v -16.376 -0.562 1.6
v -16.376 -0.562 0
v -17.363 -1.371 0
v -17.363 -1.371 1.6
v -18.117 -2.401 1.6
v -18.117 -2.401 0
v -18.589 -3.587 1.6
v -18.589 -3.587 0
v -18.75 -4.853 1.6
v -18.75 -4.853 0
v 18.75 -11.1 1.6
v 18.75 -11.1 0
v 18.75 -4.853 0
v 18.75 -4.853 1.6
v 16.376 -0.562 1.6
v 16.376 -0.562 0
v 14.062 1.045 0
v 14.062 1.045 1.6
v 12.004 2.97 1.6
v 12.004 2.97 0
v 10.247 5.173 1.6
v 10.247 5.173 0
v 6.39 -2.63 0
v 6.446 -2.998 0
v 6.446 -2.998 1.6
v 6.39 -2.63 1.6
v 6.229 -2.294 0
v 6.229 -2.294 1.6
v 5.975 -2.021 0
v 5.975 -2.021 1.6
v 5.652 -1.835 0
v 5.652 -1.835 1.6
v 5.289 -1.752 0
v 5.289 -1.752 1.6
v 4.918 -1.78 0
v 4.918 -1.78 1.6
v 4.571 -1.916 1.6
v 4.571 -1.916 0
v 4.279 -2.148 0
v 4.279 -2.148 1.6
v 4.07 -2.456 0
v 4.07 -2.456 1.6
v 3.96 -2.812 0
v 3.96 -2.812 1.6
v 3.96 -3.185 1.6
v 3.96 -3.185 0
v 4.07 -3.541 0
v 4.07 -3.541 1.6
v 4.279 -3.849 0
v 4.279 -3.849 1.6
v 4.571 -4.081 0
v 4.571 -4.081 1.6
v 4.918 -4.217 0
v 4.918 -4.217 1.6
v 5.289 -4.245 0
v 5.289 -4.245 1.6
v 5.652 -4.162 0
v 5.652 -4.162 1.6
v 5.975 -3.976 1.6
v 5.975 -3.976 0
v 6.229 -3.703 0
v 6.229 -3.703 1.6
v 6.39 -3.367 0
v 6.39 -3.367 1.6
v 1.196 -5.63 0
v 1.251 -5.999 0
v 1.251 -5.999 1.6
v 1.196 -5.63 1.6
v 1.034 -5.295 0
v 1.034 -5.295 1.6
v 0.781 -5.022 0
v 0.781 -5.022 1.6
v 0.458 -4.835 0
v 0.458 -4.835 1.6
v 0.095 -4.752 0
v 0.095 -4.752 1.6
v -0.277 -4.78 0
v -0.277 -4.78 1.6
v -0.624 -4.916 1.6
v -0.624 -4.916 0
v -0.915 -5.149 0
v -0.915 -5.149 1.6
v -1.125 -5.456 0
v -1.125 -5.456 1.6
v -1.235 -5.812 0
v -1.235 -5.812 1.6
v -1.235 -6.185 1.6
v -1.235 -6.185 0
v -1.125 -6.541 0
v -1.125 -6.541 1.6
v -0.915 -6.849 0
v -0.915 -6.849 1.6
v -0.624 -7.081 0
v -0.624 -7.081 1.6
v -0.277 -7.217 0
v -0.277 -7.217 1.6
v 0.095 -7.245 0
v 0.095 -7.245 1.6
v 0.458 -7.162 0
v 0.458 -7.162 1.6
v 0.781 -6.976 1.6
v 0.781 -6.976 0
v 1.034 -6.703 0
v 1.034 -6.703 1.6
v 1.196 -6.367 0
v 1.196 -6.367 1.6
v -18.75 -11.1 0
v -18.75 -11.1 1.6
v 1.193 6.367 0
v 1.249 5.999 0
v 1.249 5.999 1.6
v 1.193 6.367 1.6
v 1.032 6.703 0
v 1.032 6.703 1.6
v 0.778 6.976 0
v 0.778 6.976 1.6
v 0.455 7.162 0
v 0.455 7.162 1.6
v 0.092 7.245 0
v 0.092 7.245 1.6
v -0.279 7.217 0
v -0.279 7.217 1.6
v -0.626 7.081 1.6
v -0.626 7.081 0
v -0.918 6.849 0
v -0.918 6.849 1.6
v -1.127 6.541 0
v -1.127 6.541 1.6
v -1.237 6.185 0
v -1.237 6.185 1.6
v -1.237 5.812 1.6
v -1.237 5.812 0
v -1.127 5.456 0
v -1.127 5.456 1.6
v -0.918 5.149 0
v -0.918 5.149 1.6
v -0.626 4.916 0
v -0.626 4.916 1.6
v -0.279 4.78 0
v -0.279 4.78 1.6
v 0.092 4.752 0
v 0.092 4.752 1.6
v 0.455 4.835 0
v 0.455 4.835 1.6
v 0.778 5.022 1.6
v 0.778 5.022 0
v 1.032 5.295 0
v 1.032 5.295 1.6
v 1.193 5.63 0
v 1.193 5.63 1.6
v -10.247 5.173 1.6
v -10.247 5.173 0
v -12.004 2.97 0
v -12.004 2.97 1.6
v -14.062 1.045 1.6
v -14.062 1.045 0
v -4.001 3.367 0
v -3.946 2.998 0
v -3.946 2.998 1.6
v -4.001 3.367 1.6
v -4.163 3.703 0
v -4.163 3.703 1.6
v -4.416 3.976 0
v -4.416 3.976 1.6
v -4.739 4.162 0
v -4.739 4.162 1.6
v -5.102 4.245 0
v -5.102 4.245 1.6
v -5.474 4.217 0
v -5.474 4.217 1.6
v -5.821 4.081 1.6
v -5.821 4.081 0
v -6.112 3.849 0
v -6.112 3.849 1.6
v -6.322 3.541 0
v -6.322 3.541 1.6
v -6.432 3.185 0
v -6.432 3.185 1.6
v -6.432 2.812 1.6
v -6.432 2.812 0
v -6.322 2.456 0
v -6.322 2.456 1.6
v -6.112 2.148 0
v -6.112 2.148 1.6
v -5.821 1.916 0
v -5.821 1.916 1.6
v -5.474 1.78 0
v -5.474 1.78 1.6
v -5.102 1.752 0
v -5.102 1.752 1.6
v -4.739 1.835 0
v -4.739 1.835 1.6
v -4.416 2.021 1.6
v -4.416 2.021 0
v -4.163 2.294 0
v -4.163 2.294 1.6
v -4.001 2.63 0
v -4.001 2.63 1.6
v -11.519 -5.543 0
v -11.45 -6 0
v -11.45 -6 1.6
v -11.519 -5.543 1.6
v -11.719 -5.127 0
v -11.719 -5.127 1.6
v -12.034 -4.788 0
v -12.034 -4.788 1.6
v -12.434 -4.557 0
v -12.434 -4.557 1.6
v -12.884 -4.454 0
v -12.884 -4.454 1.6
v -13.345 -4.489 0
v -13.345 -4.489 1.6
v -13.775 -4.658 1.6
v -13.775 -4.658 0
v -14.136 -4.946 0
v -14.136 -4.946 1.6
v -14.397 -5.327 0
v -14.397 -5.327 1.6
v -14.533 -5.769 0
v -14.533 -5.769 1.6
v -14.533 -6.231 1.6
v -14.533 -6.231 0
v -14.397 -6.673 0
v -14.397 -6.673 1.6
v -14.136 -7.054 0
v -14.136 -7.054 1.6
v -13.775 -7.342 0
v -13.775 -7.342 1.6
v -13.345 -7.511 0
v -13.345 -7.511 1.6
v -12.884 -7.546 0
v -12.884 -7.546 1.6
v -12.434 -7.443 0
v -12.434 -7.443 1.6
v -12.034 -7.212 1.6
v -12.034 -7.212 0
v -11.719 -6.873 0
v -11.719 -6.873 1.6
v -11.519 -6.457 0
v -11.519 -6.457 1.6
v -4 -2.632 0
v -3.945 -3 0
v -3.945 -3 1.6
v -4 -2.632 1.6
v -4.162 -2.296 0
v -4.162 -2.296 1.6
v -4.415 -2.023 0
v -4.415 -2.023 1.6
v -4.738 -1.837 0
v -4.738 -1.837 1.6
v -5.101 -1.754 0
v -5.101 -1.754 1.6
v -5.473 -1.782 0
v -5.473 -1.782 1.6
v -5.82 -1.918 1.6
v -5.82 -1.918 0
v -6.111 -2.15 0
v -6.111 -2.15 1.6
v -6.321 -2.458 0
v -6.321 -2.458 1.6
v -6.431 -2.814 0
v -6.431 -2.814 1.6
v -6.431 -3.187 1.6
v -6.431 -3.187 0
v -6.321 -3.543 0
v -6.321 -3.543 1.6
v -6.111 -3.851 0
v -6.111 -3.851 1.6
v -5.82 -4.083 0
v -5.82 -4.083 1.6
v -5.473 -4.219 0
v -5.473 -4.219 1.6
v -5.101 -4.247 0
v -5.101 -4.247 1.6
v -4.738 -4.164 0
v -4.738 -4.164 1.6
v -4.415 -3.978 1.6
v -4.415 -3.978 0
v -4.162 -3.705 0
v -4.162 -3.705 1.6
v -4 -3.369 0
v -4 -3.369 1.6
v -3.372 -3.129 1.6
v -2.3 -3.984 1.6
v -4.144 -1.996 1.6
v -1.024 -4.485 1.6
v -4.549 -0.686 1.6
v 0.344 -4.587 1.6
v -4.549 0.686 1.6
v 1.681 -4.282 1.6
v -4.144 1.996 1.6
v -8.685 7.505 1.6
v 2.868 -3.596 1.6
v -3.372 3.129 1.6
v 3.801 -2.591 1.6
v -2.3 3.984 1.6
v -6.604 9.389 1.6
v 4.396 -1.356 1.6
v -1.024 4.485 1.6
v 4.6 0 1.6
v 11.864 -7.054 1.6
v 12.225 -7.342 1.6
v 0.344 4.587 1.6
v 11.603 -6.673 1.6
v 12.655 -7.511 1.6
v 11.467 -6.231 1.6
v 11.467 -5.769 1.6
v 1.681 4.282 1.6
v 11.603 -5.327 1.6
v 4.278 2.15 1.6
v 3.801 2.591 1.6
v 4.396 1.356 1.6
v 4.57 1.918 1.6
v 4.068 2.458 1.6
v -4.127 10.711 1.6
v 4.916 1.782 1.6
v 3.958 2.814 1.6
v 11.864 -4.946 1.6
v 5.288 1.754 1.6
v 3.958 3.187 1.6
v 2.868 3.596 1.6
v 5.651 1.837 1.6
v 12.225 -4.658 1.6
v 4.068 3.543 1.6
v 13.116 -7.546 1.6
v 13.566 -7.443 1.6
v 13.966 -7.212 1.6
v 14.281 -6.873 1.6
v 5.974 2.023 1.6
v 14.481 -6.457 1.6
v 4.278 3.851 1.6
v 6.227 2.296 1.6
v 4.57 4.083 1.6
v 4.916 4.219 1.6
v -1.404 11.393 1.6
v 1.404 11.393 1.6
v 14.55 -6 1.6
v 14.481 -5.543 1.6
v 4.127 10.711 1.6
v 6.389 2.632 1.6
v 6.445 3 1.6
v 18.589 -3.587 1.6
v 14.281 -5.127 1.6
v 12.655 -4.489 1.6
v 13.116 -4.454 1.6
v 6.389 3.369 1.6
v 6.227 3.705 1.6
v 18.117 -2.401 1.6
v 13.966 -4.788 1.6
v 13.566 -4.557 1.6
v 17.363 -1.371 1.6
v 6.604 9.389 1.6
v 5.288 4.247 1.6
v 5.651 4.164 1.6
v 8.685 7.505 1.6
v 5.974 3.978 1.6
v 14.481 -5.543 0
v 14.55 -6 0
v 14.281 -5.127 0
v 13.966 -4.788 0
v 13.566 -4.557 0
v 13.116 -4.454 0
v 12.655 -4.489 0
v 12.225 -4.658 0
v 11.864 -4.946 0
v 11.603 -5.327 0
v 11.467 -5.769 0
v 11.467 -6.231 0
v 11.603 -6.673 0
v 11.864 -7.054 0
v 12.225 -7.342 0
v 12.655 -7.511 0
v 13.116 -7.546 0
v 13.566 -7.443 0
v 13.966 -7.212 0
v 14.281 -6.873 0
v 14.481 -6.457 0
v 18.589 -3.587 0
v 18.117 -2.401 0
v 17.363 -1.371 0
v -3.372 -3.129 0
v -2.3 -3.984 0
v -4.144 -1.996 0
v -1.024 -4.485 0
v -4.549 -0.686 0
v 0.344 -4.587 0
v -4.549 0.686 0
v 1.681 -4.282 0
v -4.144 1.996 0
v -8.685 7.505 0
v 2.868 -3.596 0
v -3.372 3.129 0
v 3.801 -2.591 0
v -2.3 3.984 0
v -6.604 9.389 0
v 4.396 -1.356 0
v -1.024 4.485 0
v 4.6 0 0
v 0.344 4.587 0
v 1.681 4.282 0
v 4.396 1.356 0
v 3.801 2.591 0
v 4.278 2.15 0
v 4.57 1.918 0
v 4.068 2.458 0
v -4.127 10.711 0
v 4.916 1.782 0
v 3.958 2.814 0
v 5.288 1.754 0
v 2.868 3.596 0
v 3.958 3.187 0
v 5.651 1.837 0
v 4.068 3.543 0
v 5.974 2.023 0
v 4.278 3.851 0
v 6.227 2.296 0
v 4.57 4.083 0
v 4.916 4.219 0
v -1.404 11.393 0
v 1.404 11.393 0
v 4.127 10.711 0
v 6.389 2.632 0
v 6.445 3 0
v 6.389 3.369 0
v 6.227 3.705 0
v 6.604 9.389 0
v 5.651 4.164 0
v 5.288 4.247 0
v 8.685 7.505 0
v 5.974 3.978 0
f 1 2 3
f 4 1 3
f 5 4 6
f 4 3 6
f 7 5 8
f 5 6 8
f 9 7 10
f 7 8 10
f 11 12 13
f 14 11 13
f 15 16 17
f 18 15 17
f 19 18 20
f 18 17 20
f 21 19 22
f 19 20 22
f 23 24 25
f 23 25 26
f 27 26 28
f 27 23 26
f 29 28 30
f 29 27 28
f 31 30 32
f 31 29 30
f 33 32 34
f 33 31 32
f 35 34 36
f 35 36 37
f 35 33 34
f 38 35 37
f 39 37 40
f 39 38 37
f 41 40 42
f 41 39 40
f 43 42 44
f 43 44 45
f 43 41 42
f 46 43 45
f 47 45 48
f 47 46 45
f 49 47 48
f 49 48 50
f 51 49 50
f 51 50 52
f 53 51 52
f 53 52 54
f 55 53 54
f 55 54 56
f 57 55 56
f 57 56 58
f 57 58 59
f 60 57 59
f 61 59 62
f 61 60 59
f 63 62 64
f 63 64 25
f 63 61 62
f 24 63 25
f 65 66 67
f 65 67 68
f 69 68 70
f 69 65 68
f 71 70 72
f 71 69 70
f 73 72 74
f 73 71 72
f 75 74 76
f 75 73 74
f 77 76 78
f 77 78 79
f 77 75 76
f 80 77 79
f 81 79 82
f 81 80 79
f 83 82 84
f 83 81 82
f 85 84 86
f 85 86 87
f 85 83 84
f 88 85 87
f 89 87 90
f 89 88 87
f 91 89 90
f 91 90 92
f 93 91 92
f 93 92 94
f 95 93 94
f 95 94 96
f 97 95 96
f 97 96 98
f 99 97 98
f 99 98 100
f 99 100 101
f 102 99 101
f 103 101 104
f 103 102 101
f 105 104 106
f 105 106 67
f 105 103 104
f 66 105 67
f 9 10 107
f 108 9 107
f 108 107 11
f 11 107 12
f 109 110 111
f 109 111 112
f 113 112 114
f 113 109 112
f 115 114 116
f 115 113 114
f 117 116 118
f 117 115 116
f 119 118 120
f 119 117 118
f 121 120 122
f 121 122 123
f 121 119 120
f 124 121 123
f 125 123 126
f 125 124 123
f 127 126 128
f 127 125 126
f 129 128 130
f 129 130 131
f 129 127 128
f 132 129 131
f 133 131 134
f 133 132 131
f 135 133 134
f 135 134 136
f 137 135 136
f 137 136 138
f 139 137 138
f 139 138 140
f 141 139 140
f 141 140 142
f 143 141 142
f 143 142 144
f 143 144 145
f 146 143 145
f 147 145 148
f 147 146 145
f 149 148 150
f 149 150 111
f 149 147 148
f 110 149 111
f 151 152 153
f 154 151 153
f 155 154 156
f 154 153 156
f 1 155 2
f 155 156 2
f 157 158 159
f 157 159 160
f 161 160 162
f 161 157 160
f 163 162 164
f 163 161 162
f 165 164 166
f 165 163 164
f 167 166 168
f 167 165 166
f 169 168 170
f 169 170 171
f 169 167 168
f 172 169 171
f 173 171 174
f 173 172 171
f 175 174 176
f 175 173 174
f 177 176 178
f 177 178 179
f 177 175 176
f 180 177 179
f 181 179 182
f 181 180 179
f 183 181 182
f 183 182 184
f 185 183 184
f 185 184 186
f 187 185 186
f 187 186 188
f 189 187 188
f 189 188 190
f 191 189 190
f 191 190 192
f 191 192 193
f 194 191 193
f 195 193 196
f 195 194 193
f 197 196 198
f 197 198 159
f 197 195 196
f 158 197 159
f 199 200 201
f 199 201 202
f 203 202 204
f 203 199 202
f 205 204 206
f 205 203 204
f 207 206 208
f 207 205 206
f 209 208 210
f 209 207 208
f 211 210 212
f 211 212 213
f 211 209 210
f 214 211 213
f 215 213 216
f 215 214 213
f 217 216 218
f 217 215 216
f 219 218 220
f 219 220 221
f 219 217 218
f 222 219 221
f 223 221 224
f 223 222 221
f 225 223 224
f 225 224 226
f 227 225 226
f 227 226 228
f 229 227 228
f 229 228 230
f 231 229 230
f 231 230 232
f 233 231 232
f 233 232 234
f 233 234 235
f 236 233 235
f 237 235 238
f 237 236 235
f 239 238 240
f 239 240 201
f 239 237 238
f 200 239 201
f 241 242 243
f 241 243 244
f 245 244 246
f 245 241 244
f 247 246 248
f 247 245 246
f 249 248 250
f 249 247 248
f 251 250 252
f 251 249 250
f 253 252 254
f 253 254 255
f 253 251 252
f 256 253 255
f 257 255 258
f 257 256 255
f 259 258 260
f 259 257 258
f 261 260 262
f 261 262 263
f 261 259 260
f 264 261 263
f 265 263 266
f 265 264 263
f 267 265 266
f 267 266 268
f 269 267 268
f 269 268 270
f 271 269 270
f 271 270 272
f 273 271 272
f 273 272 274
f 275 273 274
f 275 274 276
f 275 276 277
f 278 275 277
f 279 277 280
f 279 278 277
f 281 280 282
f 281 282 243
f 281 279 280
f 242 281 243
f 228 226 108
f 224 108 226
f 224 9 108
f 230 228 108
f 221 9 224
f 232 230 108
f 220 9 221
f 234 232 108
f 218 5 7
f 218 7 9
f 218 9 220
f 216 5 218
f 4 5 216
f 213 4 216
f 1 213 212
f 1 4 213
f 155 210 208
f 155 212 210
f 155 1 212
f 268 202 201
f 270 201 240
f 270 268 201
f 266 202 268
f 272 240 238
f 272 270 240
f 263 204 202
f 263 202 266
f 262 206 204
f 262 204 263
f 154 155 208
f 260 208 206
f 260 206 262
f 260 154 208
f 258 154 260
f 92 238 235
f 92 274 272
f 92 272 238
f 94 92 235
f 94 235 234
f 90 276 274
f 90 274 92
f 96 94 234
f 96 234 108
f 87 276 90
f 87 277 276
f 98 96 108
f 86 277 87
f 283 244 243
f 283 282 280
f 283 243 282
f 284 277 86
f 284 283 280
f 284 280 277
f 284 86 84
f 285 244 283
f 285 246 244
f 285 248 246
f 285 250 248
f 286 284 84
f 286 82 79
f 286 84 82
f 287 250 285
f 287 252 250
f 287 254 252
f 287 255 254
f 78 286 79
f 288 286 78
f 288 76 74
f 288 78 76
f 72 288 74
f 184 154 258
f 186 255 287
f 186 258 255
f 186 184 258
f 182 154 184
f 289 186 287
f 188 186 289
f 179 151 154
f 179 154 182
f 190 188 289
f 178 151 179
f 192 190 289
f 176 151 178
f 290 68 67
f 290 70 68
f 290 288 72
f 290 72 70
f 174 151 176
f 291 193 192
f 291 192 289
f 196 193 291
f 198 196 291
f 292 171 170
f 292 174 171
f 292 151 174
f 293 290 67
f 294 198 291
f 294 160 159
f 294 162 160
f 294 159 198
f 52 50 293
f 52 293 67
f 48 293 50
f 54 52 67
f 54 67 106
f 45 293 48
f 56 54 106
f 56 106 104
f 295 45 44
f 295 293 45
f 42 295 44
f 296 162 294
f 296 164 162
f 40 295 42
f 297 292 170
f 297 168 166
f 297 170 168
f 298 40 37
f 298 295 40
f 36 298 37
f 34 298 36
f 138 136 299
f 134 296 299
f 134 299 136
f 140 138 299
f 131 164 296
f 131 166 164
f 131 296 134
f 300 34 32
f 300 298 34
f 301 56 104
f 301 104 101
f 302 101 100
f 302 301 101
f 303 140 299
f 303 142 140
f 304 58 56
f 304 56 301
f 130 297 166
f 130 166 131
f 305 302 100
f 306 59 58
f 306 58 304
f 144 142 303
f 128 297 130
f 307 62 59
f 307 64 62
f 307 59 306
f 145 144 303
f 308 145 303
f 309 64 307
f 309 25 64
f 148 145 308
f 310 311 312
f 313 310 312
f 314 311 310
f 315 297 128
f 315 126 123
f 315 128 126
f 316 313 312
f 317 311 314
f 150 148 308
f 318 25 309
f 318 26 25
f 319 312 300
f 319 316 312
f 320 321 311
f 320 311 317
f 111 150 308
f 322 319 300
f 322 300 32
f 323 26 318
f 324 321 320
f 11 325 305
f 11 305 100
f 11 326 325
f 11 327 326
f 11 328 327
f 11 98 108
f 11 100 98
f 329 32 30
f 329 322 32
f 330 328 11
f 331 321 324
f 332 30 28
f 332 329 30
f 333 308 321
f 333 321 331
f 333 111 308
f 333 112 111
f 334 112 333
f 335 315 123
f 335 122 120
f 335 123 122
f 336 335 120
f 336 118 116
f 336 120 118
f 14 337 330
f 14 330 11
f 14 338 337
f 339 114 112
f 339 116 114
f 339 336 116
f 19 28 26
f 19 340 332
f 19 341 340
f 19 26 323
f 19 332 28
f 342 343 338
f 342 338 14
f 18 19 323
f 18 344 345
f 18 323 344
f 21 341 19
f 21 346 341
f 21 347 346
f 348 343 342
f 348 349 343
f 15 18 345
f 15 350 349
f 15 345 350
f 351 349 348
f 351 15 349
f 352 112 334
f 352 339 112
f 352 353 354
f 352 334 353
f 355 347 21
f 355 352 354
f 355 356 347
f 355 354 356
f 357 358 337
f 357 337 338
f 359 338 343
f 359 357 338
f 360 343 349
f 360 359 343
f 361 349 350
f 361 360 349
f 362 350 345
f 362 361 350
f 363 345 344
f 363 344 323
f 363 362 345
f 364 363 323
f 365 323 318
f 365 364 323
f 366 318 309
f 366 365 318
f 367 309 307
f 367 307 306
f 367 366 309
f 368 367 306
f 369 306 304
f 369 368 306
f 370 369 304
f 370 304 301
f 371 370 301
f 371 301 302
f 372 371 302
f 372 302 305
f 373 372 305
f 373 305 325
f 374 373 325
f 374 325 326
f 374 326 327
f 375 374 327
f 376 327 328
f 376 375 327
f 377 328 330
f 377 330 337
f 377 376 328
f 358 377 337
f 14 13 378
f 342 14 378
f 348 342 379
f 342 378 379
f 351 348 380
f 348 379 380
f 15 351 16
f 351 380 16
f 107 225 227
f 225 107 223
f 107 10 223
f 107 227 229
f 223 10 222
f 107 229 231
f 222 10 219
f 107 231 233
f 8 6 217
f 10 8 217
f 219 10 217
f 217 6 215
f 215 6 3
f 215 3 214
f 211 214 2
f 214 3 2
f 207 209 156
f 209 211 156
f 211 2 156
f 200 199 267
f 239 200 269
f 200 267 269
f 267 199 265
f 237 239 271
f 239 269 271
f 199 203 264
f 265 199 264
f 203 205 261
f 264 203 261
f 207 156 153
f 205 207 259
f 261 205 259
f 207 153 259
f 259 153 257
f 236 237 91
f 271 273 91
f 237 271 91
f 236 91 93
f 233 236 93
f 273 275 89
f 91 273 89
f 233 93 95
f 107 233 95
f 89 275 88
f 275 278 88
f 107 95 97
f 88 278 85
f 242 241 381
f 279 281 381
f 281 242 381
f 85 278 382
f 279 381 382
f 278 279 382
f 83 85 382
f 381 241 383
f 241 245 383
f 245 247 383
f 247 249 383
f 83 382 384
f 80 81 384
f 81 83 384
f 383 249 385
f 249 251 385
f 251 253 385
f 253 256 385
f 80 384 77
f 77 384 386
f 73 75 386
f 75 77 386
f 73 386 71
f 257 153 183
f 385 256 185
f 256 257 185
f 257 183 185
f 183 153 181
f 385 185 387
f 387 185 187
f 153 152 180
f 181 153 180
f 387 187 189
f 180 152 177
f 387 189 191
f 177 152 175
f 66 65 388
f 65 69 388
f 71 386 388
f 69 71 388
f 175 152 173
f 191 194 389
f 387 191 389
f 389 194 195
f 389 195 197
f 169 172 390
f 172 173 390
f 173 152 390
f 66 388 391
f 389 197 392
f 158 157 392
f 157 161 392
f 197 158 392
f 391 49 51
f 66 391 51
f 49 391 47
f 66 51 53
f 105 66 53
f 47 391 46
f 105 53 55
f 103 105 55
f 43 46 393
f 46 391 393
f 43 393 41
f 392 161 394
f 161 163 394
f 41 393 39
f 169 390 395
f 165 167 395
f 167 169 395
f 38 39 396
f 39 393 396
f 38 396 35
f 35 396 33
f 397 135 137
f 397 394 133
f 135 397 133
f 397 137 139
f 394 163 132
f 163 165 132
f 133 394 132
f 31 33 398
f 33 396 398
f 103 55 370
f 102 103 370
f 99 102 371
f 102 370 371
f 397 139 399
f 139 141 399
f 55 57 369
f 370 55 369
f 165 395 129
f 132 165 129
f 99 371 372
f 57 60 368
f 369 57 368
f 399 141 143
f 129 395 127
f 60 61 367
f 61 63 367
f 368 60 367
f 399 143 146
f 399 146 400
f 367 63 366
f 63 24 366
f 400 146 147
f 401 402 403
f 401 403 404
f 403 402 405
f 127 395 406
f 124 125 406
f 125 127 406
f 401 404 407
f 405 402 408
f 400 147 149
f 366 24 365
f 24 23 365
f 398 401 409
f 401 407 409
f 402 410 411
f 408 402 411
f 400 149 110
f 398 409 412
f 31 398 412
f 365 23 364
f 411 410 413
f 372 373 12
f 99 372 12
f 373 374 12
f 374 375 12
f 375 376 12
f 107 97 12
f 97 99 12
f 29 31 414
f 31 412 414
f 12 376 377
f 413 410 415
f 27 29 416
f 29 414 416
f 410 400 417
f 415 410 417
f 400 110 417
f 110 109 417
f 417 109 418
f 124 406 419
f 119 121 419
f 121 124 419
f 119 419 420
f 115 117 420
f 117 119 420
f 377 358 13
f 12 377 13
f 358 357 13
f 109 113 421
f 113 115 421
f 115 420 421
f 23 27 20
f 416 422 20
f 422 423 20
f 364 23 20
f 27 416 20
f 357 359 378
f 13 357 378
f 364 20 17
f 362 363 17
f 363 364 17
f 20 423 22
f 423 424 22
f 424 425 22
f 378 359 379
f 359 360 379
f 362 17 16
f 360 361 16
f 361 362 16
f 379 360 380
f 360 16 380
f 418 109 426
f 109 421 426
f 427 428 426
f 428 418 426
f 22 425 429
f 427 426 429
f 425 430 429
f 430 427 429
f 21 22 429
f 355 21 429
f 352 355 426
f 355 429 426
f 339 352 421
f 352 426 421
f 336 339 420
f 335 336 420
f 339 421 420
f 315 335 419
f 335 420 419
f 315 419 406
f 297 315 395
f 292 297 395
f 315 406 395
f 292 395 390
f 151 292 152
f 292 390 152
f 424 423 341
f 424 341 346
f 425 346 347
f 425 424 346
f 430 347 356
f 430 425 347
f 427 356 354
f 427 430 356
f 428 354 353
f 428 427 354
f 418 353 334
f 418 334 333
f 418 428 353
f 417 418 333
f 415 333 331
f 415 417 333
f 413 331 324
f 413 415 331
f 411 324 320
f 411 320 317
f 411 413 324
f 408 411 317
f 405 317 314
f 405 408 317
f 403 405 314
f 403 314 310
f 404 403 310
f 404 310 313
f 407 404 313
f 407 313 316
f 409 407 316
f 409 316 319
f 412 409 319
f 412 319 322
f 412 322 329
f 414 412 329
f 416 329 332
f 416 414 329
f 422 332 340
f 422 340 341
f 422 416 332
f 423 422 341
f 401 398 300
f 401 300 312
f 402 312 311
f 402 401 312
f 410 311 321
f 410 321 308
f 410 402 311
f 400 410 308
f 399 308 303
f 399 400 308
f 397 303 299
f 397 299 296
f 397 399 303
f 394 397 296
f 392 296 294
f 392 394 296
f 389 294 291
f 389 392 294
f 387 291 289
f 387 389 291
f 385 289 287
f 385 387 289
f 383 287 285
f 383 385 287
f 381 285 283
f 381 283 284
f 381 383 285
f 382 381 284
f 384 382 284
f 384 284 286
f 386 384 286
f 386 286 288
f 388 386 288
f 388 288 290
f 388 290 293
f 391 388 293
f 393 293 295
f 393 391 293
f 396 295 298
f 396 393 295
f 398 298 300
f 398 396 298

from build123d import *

# Parameters (mm, degrees)
CROQUIS1_R              = 4.6
CROQUIS1_R_2            = 1.249999997
CROQUIS1_R_3            = 1.25
CROQUIS1_R_4            = 1.250000007
CROQUIS1_R_5            = 1.55
SALIENTE_EXTRUIR1_DEPTH = 1.6


with BuildPart() as part:
    # Croquis1 → Saliente-Extruir1 (new body)
    with BuildSketch(Plane.XY):
        with BuildLine():
            Line((-18.75, -11.1), (18.75, -11.1))
            Line((18.75, -11.1), (18.75, -4.852747113))
            ThreePointArc((18.75, -4.852747113), (18.116780108, -2.400965101), (16.375506293, -0.562441789))
            ThreePointArc((16.375506293, -0.562441789), (12.997975085, 1.970224072), (10.247264226, 5.172676757))
            ThreePointArc((10.247264226, 5.172676757), (0, 11.478806947), (-10.247264226, 5.172676757))
            ThreePointArc((-10.247264226, 5.172676757), (-12.997975085, 1.970224072), (-16.375506293, -0.562441789))
            ThreePointArc((-16.375506293, -0.562441789), (-18.116780108, -2.400965101), (-18.75, -4.852747113))
            Line((-18.75, -4.852747113), (-18.75, -11.1))
        make_face()
        Circle(CROQUIS1_R, mode=Mode.SUBTRACT)
        with Locations((-0.0012, 5.99880001)):
            Circle(CROQUIS1_R_2, mode=Mode.SUBTRACT)
        with Locations((5.194513192, 3.000439231)):
            Circle(CROQUIS1_R_3, mode=Mode.SUBTRACT)
        with Locations((5.195713192, -2.998360769)):
            Circle(CROQUIS1_R_3, mode=Mode.SUBTRACT)
        with Locations((0.0012, -5.9988)):
            Circle(CROQUIS1_R_3, mode=Mode.SUBTRACT)
        with Locations((-5.194513192, -3.00043923)):
            Circle(CROQUIS1_R_3, mode=Mode.SUBTRACT)
        with Locations((-5.195713248, 2.998360802)):
            Circle(CROQUIS1_R_4, mode=Mode.SUBTRACT)
        with Locations((13, -6)):
            Circle(CROQUIS1_R_5, mode=Mode.SUBTRACT)
        with Locations((-13, -6)):
            Circle(CROQUIS1_R_5, mode=Mode.SUBTRACT)
    extrude(amount=SALIENTE_EXTRUIR1_DEPTH)


solid = part.part
